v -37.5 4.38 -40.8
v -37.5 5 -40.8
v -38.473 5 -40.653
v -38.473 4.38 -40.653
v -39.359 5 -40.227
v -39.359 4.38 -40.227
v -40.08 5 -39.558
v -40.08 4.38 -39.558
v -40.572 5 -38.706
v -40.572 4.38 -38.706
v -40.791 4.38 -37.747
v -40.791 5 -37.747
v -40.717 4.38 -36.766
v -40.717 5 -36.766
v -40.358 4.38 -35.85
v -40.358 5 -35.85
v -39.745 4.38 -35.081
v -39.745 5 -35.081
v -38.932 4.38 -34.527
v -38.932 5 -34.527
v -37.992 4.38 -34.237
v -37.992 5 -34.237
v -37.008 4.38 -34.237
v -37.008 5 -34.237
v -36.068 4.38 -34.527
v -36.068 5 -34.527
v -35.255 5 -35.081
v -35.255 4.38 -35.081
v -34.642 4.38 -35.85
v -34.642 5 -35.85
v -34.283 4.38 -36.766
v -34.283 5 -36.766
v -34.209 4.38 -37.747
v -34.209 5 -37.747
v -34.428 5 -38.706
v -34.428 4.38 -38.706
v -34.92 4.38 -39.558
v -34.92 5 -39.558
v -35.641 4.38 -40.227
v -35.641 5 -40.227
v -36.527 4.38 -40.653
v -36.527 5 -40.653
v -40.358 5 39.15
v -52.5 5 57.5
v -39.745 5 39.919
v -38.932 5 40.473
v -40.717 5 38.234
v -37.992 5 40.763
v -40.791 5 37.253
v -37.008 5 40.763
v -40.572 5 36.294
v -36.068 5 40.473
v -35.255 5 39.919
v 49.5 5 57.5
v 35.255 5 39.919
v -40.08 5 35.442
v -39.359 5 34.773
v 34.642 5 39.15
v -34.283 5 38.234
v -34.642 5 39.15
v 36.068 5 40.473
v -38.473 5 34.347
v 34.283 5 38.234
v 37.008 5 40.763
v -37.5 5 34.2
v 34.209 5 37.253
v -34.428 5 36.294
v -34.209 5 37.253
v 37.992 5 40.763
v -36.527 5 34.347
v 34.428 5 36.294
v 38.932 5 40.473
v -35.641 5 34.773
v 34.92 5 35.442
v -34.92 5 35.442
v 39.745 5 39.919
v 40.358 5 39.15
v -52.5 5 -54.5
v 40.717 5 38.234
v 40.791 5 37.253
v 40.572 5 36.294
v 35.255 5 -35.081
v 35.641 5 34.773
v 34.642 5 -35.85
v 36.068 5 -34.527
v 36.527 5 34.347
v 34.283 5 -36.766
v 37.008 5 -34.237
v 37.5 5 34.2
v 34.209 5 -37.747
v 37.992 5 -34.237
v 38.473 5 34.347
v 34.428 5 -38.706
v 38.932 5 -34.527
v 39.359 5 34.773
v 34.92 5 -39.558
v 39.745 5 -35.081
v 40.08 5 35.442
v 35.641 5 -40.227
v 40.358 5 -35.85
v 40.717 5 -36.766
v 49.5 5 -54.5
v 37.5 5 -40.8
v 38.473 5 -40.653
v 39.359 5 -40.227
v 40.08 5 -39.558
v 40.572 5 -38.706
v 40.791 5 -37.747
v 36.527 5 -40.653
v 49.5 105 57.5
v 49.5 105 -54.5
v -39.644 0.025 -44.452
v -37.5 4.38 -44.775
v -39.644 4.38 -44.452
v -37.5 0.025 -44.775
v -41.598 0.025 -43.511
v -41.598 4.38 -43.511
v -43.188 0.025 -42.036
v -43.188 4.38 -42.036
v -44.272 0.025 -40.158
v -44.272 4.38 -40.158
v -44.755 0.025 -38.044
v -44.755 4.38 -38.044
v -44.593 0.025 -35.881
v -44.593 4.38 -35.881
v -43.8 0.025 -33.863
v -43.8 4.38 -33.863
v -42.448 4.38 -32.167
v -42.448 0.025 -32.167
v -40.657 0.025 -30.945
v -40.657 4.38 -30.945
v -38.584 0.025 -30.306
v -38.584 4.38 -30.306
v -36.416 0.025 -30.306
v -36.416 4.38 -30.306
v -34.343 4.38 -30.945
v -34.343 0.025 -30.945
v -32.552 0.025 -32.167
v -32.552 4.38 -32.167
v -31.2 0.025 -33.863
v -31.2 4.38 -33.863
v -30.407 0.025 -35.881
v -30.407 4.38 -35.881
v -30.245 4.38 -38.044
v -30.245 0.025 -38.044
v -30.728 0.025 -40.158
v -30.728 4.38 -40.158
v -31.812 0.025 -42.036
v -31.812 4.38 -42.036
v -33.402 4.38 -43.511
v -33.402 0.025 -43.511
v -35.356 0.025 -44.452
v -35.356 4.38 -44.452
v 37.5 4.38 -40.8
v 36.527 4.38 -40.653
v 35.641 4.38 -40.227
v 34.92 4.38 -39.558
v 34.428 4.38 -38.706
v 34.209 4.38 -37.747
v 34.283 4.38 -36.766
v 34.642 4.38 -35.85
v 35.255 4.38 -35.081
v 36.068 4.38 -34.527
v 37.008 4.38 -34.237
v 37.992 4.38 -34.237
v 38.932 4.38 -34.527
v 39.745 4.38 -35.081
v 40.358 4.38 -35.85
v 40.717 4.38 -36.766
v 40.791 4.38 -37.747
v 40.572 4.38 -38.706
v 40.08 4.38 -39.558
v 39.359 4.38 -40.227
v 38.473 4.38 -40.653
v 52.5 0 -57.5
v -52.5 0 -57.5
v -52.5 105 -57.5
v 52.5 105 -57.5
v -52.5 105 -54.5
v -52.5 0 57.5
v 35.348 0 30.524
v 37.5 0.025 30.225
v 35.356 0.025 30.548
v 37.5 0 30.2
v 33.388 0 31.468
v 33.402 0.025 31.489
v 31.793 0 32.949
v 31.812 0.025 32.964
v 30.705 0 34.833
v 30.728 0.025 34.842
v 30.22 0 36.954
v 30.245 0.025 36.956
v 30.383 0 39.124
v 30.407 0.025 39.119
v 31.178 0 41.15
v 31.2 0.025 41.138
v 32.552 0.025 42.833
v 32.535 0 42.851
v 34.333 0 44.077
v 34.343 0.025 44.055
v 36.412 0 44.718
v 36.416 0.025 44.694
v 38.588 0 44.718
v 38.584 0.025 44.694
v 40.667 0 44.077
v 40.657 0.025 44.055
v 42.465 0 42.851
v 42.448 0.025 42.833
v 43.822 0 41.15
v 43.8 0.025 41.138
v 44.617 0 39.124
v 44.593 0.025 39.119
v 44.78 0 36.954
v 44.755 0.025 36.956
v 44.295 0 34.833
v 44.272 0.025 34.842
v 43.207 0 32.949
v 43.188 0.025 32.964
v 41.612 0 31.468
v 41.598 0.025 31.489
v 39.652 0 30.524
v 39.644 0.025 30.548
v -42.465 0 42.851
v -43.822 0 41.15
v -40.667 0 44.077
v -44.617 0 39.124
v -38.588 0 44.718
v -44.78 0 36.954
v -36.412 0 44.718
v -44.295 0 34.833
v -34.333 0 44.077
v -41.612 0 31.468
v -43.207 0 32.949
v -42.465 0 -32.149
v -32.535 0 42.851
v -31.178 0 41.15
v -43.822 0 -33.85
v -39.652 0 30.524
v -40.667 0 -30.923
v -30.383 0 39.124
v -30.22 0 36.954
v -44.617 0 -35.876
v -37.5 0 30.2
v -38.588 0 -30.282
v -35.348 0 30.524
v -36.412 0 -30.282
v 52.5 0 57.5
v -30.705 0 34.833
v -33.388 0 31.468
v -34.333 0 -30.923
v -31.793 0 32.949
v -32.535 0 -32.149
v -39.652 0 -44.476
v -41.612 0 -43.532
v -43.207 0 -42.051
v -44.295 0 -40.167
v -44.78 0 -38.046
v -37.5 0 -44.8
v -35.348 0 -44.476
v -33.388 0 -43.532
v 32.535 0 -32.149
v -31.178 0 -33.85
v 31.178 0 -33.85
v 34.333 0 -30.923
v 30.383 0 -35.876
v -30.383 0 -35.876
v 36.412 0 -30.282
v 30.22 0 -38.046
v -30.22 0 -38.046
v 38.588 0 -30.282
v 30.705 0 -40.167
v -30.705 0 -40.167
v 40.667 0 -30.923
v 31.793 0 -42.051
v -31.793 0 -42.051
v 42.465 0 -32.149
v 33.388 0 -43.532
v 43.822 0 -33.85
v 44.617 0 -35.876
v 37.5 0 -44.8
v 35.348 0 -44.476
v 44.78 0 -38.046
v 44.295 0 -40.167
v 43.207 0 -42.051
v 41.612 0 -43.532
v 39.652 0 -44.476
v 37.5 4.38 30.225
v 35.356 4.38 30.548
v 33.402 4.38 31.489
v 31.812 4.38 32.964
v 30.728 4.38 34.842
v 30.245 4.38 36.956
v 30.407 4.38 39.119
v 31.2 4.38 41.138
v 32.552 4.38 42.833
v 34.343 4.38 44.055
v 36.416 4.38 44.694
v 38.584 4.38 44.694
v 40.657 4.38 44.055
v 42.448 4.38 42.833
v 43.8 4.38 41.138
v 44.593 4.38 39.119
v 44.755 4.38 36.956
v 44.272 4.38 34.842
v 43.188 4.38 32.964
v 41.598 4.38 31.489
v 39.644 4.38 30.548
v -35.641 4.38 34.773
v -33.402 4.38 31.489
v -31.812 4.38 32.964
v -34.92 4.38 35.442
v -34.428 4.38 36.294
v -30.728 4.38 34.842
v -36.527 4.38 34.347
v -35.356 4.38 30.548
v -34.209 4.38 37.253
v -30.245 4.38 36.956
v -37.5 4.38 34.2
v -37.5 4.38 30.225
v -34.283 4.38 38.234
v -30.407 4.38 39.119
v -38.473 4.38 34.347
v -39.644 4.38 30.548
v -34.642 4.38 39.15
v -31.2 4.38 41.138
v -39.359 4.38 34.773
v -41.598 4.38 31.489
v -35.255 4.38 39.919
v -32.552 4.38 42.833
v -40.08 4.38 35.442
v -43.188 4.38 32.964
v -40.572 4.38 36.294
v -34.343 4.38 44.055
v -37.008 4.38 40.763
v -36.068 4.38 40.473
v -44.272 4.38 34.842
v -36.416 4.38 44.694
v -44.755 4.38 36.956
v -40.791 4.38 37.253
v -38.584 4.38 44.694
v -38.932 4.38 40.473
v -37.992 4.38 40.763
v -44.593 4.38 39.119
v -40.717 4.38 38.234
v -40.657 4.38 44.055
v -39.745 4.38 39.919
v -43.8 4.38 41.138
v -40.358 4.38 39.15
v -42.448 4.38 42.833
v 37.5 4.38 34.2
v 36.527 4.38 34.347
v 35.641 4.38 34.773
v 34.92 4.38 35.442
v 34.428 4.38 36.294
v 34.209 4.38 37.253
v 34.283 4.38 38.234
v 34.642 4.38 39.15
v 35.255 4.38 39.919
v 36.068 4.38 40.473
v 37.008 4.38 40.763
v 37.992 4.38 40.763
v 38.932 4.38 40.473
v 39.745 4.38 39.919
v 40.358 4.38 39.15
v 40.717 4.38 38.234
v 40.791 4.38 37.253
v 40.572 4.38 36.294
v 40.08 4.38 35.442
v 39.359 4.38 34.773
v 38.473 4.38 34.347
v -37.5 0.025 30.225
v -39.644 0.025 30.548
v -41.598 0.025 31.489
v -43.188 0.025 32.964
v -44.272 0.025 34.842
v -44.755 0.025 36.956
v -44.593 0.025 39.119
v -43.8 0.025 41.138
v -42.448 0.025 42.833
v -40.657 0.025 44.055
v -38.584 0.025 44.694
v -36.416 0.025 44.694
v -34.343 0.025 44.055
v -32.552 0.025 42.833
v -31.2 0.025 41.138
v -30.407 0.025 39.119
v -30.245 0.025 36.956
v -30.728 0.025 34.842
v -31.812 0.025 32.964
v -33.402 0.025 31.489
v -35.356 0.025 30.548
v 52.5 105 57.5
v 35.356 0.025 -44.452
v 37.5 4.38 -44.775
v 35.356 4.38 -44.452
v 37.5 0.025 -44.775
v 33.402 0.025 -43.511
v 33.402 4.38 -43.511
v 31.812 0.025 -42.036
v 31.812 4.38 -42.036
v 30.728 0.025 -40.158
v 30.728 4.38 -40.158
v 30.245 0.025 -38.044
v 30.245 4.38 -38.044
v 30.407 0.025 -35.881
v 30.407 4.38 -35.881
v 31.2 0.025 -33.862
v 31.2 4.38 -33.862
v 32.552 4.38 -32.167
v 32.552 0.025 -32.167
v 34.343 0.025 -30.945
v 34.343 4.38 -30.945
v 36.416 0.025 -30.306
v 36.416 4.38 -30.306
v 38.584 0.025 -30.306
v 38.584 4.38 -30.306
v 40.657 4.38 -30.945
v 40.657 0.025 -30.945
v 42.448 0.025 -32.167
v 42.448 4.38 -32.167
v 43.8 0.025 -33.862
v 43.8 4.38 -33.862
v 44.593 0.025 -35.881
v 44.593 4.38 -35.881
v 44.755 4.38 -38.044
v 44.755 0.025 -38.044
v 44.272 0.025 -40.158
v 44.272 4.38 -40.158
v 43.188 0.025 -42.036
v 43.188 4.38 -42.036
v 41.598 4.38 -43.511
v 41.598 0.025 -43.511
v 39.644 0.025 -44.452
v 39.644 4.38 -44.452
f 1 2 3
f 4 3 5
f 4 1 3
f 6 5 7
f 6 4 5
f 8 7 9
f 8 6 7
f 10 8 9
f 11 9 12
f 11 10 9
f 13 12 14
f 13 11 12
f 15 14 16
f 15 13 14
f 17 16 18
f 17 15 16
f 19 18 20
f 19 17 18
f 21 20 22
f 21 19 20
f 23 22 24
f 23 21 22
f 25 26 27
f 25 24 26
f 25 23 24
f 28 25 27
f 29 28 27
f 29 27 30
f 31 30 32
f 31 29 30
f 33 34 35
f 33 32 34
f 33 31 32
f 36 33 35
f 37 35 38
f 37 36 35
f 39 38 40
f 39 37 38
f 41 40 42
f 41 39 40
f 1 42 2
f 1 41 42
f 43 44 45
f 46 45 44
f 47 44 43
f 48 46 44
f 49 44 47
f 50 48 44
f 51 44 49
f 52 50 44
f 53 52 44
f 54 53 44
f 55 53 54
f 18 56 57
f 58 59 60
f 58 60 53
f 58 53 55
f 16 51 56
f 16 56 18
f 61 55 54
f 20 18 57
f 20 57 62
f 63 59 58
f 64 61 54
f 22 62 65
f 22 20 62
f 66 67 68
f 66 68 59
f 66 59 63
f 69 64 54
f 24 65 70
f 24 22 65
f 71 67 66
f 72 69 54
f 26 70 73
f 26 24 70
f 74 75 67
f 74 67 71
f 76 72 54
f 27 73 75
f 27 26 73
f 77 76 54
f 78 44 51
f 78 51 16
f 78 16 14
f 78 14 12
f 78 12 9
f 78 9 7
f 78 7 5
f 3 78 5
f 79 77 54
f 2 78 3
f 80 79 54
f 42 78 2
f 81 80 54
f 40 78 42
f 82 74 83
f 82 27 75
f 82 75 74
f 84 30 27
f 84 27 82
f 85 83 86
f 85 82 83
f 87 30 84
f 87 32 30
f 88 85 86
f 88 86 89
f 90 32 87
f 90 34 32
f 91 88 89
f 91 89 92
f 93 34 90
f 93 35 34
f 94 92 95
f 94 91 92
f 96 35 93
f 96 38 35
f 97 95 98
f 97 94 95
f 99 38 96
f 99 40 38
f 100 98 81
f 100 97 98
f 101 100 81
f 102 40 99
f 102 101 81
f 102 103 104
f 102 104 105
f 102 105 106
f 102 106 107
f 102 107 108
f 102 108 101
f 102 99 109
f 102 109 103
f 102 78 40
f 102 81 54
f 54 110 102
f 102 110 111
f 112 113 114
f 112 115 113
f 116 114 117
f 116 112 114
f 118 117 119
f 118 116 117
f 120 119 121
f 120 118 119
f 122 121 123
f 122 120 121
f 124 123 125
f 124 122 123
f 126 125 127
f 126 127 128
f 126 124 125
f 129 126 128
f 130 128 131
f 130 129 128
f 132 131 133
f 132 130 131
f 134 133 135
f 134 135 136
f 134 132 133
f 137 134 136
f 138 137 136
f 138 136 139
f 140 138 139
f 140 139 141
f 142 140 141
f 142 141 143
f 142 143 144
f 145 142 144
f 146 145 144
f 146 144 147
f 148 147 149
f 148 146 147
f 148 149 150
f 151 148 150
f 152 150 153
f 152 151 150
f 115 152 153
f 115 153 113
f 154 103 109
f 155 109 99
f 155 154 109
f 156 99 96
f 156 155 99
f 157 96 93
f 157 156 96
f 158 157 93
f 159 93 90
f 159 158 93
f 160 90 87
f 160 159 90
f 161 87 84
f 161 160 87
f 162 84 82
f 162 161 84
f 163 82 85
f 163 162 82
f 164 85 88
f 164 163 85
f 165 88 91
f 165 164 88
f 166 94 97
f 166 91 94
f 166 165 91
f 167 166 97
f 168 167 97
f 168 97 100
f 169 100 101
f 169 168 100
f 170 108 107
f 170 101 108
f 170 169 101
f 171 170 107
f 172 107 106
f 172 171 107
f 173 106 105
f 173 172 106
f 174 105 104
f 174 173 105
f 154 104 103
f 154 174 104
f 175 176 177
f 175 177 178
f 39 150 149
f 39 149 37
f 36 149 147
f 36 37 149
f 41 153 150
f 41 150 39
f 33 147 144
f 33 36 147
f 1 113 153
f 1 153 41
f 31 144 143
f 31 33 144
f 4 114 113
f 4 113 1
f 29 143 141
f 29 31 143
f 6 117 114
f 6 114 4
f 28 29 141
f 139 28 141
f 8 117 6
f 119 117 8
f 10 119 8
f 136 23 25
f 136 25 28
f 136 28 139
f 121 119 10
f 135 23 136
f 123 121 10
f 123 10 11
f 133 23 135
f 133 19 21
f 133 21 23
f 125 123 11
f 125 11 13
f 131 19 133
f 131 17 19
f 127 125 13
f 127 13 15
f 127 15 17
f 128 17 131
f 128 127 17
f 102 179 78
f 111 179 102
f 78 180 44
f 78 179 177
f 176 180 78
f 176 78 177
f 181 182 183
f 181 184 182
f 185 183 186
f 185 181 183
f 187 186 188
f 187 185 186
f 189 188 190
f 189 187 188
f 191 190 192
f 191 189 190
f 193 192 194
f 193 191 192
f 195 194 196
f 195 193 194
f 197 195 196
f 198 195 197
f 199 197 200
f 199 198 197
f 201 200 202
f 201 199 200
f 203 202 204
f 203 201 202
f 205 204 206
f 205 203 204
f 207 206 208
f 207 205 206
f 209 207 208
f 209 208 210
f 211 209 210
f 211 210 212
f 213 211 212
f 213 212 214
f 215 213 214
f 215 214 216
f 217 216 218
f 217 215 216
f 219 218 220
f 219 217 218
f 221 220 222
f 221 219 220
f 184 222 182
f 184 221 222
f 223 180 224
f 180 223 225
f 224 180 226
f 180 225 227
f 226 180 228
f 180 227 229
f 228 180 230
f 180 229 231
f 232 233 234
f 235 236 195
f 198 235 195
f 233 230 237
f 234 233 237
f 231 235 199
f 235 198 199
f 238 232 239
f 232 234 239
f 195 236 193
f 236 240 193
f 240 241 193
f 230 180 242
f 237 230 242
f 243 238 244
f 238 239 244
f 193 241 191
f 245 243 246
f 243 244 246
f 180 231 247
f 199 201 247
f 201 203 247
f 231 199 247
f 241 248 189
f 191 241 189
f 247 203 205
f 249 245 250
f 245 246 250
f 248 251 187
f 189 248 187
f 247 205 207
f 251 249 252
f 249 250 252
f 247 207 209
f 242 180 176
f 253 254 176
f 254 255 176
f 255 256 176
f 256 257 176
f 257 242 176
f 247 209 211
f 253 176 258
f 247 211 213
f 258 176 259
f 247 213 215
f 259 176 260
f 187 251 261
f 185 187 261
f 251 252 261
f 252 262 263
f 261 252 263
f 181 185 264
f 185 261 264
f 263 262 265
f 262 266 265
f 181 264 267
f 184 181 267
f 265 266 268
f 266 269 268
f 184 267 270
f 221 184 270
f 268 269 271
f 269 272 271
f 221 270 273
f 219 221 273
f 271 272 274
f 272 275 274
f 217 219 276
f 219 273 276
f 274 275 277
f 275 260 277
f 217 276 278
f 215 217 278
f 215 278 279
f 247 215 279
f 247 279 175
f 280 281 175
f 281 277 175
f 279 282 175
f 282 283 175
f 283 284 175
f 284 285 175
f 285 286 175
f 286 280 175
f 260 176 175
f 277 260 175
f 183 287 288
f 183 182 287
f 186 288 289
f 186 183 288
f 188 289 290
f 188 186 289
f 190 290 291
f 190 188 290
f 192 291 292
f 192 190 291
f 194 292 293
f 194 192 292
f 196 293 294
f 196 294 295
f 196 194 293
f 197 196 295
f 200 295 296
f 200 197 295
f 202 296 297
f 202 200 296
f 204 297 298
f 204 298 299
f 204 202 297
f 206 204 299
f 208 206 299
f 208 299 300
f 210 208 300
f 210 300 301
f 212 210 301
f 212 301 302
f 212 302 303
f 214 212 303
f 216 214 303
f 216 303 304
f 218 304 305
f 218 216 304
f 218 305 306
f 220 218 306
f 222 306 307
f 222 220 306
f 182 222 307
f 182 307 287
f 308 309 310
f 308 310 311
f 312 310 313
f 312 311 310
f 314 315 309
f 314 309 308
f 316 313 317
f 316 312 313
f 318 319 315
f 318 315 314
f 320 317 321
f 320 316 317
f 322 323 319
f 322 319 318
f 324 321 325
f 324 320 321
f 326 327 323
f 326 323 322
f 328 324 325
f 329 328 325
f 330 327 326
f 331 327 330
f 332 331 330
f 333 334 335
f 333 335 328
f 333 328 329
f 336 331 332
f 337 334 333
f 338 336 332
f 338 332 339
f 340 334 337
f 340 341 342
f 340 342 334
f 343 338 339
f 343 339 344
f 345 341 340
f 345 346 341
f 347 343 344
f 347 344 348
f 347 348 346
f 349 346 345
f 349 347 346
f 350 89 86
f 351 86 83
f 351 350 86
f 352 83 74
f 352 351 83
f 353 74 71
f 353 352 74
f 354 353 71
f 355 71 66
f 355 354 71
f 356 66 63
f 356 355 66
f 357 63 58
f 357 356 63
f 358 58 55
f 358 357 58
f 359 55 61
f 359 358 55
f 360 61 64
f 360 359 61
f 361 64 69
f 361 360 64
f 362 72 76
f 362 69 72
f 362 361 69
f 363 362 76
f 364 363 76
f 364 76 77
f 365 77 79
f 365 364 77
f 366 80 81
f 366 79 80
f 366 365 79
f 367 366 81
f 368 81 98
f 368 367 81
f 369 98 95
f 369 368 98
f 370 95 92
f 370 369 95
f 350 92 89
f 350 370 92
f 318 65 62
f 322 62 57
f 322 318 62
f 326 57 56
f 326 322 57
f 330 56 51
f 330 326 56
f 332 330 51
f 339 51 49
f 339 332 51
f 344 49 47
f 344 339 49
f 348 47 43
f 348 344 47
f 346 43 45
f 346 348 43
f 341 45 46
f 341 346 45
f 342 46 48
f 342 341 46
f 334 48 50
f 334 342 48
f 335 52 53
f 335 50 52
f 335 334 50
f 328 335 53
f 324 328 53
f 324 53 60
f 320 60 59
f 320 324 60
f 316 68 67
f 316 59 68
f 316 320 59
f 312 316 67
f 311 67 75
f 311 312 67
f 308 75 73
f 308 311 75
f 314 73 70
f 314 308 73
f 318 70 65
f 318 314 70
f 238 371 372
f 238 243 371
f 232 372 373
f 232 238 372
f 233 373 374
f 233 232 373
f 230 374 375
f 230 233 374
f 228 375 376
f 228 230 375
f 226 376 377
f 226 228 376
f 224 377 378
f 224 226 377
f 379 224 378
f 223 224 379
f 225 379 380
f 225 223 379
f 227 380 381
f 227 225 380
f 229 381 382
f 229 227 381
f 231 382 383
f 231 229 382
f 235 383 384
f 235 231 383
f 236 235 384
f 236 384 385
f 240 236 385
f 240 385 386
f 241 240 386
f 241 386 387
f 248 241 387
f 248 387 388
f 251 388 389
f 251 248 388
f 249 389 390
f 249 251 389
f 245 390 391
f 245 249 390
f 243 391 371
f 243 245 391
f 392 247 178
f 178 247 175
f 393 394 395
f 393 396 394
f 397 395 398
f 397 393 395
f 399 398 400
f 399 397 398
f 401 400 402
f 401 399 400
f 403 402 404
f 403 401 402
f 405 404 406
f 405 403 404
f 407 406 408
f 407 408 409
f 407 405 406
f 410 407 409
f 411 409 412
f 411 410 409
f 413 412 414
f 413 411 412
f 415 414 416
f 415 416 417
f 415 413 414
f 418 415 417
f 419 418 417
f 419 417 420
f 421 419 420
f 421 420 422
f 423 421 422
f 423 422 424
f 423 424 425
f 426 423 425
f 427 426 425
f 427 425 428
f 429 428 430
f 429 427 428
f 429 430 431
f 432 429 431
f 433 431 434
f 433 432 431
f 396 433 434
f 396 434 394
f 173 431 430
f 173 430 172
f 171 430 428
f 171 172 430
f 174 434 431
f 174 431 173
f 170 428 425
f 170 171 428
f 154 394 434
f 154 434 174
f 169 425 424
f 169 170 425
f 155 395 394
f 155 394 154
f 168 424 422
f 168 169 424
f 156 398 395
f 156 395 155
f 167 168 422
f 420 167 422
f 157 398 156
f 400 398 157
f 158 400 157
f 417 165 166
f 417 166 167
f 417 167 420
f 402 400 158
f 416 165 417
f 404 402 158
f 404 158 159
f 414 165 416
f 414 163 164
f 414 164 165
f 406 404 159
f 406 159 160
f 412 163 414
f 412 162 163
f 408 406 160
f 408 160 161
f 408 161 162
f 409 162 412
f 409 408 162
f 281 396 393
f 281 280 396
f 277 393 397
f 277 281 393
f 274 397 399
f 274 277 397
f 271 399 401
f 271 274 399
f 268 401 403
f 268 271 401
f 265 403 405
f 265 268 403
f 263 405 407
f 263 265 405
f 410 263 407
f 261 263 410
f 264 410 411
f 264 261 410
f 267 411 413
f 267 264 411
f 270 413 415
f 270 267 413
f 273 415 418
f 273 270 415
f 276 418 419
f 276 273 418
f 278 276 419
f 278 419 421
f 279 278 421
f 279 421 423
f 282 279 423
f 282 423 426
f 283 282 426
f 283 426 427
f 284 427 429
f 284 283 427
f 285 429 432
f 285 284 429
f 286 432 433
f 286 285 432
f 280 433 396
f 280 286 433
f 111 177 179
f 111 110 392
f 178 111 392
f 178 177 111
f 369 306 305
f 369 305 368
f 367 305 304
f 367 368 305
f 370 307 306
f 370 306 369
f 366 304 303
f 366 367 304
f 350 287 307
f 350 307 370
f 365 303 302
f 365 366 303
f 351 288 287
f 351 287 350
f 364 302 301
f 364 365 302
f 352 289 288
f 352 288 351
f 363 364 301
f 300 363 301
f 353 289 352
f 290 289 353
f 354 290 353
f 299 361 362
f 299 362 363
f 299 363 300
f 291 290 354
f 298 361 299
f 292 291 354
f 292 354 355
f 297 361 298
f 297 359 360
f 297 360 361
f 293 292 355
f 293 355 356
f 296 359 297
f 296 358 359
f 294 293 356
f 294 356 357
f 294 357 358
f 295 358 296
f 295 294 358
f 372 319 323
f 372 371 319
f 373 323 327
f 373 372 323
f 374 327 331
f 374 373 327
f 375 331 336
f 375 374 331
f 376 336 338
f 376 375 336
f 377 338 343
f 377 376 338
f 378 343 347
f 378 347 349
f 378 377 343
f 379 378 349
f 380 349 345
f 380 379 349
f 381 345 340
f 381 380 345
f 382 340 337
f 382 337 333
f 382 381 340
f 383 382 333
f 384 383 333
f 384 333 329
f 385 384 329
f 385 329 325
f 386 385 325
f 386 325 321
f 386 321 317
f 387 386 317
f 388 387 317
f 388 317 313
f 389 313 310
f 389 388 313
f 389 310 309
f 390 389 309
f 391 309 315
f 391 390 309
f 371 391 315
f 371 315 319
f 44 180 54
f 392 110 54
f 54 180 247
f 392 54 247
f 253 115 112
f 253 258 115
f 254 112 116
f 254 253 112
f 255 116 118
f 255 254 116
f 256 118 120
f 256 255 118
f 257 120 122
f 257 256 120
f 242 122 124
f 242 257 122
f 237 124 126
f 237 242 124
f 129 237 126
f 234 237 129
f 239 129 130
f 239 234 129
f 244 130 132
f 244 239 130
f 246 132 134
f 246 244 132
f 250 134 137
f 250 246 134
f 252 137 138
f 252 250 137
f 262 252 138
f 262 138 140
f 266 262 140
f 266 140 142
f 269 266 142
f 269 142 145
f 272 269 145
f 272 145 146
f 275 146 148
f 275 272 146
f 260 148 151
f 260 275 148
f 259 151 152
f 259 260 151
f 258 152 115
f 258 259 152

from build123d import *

# Parameters (mm, degrees)
SKETCH3_W                              = 105
SKETCH3_H                              = 115
BOSS_EXTRUDE1_DEPTH                    = 105
SKETCH6_W                              = 102
SKETCH6_H                              = 112
CUT_EXTRUDE1_DEPTH                     = 100
CBORE_FOR_M6_HEX_HEAD_BOLT1_AT_2_COUNT = 2
CBORE_FOR_M6_HEX_HEAD_BOLT1_AT_2_PITCH = 75
CBORE_FOR_M6_HEX_HEAD_BOLT1_AT_3_COUNT = 2
CBORE_FOR_M6_HEX_HEAD_BOLT1_AT_3_PITCH = 106.066017178
CBORE_FOR_M6_HEX_HEAD_BOLT1_AT_4_COUNT = 2
CBORE_FOR_M6_HEX_HEAD_BOLT1_AT_4_PITCH = 75


with BuildPart() as part:
    # Sketch3 → Boss-Extrude1 (new body)
    with BuildSketch(Plane(origin=(0, 0, 0), x_dir=(1, 0, 0), z_dir=(0, 1, 0))):
        Rectangle(SKETCH3_W, SKETCH3_H)
    extrude(amount=BOSS_EXTRUDE1_DEPTH)

    # Sketch6 → Cut-Extrude1 (cut)
    with BuildSketch(Plane(origin=(0, 105, 0), x_dir=(1, 0, 0), z_dir=(0, 1, 0))):
        with Locations((-1.5, -1.5)):
            Rectangle(SKETCH6_W, SKETCH6_H)
    extrude(amount=-CUT_EXTRUDE1_DEPTH, mode=Mode.SUBTRACT)

    # Sketch7 → CBORE for M6 Hex Head Bolt1 (revolve, cut)
    with BuildSketch(Plane(origin=(37.5, 0, 37.5), x_dir=(0, 0, -1), z_dir=(1, 0, 0))):
        Polygon((0, 0), (0, 105), (3.3, 105), (3.3, 4.38), (7.275, 4.38), (7.275, 0.025), (7.3, 0), align=None)
    cbore_for_m6_hex_head_bolt1 = revolve(axis=Axis((37.5, -6.35, 37.5), (0, 1, 0)), mode=Mode.SUBTRACT)

    # CBORE for M6 Hex Head Bolt1 at 2: CBORE for M6 Hex Head Bolt1 ×2
    with Locations(*[(0, 0, -i * CBORE_FOR_M6_HEX_HEAD_BOLT1_AT_2_PITCH) for i in range(1, CBORE_FOR_M6_HEX_HEAD_BOLT1_AT_2_COUNT)]):
        add(cbore_for_m6_hex_head_bolt1, mode=Mode.SUBTRACT)

    # CBORE for M6 Hex Head Bolt1 at 3: CBORE for M6 Hex Head Bolt1 ×2
    with Locations(*[Vector(-0.7071067811865476, 0, -0.7071067811865476) * (i * CBORE_FOR_M6_HEX_HEAD_BOLT1_AT_3_PITCH) for i in range(1, CBORE_FOR_M6_HEX_HEAD_BOLT1_AT_3_COUNT)]):
        add(cbore_for_m6_hex_head_bolt1, mode=Mode.SUBTRACT)

    # CBORE for M6 Hex Head Bolt1 at 4: CBORE for M6 Hex Head Bolt1 ×2
    with Locations(*[(-i * CBORE_FOR_M6_HEX_HEAD_BOLT1_AT_4_PITCH, 0, 0) for i in range(1, CBORE_FOR_M6_HEX_HEAD_BOLT1_AT_4_COUNT)]):
        add(cbore_for_m6_hex_head_bolt1, mode=Mode.SUBTRACT)


solid = part.part
